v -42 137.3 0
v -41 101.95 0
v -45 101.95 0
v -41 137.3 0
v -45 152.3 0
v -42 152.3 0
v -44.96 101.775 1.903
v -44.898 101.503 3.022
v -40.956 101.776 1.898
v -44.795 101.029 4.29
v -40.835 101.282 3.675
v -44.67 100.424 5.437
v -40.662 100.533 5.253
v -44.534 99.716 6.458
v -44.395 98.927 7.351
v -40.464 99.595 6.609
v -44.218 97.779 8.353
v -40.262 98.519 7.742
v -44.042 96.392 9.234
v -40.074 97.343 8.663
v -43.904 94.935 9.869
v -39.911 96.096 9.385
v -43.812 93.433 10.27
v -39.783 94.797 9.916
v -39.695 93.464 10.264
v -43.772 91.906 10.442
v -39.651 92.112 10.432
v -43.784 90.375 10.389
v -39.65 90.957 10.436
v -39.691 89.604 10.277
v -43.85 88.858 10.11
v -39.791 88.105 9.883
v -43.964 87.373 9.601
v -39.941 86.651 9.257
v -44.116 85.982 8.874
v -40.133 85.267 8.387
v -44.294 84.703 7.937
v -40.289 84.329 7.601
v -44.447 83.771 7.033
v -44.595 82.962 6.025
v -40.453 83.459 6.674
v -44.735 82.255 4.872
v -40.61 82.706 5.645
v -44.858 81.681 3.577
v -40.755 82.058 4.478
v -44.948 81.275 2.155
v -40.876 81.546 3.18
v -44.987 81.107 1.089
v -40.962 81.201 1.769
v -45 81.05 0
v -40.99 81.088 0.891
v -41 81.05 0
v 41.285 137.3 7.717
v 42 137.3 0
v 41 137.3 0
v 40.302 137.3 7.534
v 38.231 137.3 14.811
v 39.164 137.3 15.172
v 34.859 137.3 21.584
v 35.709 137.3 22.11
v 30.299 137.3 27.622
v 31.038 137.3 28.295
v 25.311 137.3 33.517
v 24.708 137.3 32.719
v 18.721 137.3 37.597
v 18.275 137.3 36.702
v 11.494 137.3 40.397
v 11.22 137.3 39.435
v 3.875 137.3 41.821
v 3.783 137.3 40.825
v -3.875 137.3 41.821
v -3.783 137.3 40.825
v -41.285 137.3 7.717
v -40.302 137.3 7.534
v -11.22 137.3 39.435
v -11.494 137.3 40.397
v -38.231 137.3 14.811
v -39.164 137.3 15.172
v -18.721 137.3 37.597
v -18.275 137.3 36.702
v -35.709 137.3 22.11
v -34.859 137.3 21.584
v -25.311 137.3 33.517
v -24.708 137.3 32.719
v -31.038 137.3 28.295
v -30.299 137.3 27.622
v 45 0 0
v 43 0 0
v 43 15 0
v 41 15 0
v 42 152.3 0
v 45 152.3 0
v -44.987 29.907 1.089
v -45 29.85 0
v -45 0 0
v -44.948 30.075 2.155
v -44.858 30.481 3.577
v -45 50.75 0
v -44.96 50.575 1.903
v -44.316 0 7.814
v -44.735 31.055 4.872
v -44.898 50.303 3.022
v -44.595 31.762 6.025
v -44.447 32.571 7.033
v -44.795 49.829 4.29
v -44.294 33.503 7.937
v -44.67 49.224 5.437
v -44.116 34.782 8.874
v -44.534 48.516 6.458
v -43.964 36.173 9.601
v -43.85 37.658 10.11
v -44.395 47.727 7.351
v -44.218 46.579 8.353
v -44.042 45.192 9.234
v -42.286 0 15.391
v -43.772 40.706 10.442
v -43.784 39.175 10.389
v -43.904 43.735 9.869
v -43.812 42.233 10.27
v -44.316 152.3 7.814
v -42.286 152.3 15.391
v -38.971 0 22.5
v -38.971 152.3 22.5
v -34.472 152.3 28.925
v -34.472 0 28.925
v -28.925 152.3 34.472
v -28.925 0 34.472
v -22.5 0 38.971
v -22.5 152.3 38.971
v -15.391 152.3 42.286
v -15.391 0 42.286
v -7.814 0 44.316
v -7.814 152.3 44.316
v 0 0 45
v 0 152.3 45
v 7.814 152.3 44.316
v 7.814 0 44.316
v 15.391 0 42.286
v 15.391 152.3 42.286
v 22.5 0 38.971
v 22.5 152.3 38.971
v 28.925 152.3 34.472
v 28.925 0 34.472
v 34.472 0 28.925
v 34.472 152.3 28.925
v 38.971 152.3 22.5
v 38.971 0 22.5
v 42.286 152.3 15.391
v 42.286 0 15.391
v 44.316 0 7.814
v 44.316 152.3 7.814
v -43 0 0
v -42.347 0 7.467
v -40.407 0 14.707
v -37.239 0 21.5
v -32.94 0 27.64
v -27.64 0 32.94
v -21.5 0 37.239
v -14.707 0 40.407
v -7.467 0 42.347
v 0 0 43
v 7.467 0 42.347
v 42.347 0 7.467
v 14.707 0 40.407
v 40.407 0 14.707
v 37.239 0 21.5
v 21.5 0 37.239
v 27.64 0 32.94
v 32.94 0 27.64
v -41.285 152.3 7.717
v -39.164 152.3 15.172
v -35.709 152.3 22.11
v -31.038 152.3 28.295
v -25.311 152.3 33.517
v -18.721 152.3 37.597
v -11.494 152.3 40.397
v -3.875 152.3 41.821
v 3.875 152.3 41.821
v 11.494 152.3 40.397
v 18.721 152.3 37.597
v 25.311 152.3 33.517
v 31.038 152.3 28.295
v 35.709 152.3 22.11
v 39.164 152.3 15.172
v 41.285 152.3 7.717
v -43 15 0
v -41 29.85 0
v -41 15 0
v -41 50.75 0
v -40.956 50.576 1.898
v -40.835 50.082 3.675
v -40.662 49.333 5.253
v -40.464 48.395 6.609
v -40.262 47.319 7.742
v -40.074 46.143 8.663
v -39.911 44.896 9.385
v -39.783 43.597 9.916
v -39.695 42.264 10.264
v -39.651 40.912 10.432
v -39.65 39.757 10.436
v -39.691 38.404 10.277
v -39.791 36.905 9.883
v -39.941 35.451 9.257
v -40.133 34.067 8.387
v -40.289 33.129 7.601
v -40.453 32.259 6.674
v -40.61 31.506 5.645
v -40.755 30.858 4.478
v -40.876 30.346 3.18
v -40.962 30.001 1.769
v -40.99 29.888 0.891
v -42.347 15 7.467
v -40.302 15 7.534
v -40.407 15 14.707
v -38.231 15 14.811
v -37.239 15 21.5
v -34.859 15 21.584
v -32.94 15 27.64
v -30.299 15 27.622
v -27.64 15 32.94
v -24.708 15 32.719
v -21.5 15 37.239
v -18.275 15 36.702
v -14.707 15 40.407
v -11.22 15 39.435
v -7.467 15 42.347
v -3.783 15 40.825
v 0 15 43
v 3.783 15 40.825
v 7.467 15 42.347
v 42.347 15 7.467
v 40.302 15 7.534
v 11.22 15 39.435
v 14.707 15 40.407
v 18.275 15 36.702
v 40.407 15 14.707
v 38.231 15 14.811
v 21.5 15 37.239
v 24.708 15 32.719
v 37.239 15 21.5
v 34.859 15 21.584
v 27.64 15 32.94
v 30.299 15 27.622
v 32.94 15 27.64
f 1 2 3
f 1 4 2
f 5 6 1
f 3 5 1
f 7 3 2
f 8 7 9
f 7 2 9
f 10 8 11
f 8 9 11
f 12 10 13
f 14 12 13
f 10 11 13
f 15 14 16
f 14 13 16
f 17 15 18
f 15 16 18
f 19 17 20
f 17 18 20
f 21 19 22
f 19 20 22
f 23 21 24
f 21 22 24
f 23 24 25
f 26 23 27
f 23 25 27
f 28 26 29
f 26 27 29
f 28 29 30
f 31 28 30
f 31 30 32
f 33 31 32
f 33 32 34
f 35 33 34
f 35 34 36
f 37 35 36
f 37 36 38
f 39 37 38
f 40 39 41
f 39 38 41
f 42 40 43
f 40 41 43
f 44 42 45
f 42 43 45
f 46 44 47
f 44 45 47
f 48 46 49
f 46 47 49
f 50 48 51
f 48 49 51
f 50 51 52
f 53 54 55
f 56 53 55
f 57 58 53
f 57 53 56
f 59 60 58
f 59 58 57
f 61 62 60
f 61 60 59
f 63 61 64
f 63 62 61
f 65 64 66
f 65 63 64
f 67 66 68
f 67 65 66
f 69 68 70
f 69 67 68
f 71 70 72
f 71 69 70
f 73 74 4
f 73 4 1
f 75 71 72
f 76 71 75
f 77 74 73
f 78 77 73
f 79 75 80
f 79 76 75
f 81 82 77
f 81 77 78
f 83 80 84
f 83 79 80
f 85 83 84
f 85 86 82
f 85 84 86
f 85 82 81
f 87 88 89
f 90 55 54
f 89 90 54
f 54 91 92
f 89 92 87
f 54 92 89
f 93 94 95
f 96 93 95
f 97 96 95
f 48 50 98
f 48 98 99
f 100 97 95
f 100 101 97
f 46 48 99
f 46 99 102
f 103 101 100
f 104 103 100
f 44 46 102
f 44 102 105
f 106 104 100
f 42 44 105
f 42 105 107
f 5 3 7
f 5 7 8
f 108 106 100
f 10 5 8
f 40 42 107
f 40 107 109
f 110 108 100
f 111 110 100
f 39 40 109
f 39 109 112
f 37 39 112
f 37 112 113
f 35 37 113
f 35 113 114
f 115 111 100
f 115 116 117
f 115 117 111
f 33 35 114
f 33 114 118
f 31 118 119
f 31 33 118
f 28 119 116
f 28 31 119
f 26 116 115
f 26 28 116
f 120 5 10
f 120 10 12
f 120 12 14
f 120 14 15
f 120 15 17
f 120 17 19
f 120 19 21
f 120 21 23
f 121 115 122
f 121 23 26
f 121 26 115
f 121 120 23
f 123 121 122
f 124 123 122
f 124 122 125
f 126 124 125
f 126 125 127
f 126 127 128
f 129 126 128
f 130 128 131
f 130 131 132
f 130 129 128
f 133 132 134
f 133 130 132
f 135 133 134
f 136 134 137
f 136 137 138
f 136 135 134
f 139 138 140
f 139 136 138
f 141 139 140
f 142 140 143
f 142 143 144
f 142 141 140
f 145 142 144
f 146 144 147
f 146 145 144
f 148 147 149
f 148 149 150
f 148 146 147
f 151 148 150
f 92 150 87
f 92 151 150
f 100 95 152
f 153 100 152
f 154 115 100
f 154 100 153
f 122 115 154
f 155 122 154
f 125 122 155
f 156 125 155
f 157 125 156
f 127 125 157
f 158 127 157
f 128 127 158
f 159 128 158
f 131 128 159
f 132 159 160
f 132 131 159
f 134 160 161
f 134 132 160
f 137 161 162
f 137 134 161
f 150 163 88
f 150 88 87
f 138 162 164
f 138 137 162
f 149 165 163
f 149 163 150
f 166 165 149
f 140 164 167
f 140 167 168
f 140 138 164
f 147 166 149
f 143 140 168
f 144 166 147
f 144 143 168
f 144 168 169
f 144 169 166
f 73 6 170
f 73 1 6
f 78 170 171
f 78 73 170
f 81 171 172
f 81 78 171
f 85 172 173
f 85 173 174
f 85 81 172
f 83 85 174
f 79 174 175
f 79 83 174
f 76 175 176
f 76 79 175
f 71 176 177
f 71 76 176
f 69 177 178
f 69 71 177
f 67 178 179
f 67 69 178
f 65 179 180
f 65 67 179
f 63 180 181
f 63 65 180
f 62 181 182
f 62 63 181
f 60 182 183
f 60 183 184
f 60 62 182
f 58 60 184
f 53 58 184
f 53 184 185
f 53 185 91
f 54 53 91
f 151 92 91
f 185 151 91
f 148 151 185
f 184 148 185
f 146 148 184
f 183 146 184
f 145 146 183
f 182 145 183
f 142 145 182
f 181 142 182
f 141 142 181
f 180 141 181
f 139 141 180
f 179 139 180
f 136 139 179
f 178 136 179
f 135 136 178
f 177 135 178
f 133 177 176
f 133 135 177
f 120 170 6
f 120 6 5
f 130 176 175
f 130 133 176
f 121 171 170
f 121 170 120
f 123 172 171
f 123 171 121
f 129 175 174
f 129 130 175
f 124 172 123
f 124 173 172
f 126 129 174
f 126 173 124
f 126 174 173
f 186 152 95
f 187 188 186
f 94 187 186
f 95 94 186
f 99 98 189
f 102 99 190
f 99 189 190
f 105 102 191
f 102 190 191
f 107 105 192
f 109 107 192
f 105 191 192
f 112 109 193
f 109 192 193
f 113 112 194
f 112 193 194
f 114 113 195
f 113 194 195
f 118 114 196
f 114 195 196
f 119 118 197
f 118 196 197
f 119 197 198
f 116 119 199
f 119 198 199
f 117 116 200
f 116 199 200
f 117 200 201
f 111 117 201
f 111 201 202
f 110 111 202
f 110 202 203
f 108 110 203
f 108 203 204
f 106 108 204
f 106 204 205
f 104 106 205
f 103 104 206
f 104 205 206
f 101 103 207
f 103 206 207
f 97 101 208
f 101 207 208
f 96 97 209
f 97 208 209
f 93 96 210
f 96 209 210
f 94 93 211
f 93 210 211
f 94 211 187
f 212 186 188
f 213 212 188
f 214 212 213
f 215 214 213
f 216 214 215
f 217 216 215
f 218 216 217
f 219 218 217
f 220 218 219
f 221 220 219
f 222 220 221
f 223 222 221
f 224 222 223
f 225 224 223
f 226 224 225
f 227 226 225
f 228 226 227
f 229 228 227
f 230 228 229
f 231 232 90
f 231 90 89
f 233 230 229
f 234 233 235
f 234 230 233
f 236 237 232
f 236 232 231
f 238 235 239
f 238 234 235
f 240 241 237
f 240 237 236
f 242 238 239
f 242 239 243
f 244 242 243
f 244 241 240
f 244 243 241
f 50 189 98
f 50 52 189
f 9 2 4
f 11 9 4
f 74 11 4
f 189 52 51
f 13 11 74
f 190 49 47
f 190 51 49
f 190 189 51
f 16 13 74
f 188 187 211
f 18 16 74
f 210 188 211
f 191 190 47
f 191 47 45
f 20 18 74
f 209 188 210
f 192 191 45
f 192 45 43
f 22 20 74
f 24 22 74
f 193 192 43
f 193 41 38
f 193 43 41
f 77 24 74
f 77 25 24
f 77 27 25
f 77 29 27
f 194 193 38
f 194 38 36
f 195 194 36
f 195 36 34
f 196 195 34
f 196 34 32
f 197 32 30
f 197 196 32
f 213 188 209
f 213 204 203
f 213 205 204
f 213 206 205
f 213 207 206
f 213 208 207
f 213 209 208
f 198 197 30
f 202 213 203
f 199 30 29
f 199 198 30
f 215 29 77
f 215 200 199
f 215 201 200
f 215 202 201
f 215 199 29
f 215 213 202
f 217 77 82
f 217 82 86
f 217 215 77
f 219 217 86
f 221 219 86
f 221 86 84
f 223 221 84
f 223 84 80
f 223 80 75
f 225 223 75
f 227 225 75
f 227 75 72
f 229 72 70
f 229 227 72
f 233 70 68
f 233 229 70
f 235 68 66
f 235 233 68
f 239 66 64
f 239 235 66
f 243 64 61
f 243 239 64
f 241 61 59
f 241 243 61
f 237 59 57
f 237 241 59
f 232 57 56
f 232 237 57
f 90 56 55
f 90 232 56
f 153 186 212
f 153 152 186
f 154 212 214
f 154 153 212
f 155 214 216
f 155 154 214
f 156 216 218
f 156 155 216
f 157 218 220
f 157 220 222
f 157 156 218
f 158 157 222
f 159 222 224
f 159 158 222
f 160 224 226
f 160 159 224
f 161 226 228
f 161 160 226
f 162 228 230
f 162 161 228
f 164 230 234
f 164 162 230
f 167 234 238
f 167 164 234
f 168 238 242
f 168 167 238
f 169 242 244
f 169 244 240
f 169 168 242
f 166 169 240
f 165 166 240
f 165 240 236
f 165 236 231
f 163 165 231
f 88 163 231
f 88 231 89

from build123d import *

# Parameters (mm, degrees)
REVOLVE1_ANGLE     = 180
SKETCH2_R          = 10.45
CUT_EXTRUDE1_DEPTH = 166.061473397


with BuildPart() as part:
    # Sketch1 → Revolve1 (revolve)
    with BuildSketch(Plane.XY):
        Polygon((-45, 0), (-45, 152.3), (-42, 152.3), (-42, 137.3), (-41, 137.3), (-41, 15), (-43, 15), (-43, 0), align=None)
    revolve(axis=Axis((0, 0, 0), (0, 1, 0)), revolution_arc=REVOLVE1_ANGLE)

    # Sketch2 → Cut-Extrude1 (cut, through all)
    with BuildSketch(Plane(origin=(0, 0, 0), x_dir=(0, 0, -1), z_dir=(1, 0, 0))):
        with Locations((0, 40.3)):
            Circle(SKETCH2_R)
        with Locations((0, 91.5)):
            Circle(SKETCH2_R)
    extrude(amount=-CUT_EXTRUDE1_DEPTH, mode=Mode.SUBTRACT)


solid = part.part
